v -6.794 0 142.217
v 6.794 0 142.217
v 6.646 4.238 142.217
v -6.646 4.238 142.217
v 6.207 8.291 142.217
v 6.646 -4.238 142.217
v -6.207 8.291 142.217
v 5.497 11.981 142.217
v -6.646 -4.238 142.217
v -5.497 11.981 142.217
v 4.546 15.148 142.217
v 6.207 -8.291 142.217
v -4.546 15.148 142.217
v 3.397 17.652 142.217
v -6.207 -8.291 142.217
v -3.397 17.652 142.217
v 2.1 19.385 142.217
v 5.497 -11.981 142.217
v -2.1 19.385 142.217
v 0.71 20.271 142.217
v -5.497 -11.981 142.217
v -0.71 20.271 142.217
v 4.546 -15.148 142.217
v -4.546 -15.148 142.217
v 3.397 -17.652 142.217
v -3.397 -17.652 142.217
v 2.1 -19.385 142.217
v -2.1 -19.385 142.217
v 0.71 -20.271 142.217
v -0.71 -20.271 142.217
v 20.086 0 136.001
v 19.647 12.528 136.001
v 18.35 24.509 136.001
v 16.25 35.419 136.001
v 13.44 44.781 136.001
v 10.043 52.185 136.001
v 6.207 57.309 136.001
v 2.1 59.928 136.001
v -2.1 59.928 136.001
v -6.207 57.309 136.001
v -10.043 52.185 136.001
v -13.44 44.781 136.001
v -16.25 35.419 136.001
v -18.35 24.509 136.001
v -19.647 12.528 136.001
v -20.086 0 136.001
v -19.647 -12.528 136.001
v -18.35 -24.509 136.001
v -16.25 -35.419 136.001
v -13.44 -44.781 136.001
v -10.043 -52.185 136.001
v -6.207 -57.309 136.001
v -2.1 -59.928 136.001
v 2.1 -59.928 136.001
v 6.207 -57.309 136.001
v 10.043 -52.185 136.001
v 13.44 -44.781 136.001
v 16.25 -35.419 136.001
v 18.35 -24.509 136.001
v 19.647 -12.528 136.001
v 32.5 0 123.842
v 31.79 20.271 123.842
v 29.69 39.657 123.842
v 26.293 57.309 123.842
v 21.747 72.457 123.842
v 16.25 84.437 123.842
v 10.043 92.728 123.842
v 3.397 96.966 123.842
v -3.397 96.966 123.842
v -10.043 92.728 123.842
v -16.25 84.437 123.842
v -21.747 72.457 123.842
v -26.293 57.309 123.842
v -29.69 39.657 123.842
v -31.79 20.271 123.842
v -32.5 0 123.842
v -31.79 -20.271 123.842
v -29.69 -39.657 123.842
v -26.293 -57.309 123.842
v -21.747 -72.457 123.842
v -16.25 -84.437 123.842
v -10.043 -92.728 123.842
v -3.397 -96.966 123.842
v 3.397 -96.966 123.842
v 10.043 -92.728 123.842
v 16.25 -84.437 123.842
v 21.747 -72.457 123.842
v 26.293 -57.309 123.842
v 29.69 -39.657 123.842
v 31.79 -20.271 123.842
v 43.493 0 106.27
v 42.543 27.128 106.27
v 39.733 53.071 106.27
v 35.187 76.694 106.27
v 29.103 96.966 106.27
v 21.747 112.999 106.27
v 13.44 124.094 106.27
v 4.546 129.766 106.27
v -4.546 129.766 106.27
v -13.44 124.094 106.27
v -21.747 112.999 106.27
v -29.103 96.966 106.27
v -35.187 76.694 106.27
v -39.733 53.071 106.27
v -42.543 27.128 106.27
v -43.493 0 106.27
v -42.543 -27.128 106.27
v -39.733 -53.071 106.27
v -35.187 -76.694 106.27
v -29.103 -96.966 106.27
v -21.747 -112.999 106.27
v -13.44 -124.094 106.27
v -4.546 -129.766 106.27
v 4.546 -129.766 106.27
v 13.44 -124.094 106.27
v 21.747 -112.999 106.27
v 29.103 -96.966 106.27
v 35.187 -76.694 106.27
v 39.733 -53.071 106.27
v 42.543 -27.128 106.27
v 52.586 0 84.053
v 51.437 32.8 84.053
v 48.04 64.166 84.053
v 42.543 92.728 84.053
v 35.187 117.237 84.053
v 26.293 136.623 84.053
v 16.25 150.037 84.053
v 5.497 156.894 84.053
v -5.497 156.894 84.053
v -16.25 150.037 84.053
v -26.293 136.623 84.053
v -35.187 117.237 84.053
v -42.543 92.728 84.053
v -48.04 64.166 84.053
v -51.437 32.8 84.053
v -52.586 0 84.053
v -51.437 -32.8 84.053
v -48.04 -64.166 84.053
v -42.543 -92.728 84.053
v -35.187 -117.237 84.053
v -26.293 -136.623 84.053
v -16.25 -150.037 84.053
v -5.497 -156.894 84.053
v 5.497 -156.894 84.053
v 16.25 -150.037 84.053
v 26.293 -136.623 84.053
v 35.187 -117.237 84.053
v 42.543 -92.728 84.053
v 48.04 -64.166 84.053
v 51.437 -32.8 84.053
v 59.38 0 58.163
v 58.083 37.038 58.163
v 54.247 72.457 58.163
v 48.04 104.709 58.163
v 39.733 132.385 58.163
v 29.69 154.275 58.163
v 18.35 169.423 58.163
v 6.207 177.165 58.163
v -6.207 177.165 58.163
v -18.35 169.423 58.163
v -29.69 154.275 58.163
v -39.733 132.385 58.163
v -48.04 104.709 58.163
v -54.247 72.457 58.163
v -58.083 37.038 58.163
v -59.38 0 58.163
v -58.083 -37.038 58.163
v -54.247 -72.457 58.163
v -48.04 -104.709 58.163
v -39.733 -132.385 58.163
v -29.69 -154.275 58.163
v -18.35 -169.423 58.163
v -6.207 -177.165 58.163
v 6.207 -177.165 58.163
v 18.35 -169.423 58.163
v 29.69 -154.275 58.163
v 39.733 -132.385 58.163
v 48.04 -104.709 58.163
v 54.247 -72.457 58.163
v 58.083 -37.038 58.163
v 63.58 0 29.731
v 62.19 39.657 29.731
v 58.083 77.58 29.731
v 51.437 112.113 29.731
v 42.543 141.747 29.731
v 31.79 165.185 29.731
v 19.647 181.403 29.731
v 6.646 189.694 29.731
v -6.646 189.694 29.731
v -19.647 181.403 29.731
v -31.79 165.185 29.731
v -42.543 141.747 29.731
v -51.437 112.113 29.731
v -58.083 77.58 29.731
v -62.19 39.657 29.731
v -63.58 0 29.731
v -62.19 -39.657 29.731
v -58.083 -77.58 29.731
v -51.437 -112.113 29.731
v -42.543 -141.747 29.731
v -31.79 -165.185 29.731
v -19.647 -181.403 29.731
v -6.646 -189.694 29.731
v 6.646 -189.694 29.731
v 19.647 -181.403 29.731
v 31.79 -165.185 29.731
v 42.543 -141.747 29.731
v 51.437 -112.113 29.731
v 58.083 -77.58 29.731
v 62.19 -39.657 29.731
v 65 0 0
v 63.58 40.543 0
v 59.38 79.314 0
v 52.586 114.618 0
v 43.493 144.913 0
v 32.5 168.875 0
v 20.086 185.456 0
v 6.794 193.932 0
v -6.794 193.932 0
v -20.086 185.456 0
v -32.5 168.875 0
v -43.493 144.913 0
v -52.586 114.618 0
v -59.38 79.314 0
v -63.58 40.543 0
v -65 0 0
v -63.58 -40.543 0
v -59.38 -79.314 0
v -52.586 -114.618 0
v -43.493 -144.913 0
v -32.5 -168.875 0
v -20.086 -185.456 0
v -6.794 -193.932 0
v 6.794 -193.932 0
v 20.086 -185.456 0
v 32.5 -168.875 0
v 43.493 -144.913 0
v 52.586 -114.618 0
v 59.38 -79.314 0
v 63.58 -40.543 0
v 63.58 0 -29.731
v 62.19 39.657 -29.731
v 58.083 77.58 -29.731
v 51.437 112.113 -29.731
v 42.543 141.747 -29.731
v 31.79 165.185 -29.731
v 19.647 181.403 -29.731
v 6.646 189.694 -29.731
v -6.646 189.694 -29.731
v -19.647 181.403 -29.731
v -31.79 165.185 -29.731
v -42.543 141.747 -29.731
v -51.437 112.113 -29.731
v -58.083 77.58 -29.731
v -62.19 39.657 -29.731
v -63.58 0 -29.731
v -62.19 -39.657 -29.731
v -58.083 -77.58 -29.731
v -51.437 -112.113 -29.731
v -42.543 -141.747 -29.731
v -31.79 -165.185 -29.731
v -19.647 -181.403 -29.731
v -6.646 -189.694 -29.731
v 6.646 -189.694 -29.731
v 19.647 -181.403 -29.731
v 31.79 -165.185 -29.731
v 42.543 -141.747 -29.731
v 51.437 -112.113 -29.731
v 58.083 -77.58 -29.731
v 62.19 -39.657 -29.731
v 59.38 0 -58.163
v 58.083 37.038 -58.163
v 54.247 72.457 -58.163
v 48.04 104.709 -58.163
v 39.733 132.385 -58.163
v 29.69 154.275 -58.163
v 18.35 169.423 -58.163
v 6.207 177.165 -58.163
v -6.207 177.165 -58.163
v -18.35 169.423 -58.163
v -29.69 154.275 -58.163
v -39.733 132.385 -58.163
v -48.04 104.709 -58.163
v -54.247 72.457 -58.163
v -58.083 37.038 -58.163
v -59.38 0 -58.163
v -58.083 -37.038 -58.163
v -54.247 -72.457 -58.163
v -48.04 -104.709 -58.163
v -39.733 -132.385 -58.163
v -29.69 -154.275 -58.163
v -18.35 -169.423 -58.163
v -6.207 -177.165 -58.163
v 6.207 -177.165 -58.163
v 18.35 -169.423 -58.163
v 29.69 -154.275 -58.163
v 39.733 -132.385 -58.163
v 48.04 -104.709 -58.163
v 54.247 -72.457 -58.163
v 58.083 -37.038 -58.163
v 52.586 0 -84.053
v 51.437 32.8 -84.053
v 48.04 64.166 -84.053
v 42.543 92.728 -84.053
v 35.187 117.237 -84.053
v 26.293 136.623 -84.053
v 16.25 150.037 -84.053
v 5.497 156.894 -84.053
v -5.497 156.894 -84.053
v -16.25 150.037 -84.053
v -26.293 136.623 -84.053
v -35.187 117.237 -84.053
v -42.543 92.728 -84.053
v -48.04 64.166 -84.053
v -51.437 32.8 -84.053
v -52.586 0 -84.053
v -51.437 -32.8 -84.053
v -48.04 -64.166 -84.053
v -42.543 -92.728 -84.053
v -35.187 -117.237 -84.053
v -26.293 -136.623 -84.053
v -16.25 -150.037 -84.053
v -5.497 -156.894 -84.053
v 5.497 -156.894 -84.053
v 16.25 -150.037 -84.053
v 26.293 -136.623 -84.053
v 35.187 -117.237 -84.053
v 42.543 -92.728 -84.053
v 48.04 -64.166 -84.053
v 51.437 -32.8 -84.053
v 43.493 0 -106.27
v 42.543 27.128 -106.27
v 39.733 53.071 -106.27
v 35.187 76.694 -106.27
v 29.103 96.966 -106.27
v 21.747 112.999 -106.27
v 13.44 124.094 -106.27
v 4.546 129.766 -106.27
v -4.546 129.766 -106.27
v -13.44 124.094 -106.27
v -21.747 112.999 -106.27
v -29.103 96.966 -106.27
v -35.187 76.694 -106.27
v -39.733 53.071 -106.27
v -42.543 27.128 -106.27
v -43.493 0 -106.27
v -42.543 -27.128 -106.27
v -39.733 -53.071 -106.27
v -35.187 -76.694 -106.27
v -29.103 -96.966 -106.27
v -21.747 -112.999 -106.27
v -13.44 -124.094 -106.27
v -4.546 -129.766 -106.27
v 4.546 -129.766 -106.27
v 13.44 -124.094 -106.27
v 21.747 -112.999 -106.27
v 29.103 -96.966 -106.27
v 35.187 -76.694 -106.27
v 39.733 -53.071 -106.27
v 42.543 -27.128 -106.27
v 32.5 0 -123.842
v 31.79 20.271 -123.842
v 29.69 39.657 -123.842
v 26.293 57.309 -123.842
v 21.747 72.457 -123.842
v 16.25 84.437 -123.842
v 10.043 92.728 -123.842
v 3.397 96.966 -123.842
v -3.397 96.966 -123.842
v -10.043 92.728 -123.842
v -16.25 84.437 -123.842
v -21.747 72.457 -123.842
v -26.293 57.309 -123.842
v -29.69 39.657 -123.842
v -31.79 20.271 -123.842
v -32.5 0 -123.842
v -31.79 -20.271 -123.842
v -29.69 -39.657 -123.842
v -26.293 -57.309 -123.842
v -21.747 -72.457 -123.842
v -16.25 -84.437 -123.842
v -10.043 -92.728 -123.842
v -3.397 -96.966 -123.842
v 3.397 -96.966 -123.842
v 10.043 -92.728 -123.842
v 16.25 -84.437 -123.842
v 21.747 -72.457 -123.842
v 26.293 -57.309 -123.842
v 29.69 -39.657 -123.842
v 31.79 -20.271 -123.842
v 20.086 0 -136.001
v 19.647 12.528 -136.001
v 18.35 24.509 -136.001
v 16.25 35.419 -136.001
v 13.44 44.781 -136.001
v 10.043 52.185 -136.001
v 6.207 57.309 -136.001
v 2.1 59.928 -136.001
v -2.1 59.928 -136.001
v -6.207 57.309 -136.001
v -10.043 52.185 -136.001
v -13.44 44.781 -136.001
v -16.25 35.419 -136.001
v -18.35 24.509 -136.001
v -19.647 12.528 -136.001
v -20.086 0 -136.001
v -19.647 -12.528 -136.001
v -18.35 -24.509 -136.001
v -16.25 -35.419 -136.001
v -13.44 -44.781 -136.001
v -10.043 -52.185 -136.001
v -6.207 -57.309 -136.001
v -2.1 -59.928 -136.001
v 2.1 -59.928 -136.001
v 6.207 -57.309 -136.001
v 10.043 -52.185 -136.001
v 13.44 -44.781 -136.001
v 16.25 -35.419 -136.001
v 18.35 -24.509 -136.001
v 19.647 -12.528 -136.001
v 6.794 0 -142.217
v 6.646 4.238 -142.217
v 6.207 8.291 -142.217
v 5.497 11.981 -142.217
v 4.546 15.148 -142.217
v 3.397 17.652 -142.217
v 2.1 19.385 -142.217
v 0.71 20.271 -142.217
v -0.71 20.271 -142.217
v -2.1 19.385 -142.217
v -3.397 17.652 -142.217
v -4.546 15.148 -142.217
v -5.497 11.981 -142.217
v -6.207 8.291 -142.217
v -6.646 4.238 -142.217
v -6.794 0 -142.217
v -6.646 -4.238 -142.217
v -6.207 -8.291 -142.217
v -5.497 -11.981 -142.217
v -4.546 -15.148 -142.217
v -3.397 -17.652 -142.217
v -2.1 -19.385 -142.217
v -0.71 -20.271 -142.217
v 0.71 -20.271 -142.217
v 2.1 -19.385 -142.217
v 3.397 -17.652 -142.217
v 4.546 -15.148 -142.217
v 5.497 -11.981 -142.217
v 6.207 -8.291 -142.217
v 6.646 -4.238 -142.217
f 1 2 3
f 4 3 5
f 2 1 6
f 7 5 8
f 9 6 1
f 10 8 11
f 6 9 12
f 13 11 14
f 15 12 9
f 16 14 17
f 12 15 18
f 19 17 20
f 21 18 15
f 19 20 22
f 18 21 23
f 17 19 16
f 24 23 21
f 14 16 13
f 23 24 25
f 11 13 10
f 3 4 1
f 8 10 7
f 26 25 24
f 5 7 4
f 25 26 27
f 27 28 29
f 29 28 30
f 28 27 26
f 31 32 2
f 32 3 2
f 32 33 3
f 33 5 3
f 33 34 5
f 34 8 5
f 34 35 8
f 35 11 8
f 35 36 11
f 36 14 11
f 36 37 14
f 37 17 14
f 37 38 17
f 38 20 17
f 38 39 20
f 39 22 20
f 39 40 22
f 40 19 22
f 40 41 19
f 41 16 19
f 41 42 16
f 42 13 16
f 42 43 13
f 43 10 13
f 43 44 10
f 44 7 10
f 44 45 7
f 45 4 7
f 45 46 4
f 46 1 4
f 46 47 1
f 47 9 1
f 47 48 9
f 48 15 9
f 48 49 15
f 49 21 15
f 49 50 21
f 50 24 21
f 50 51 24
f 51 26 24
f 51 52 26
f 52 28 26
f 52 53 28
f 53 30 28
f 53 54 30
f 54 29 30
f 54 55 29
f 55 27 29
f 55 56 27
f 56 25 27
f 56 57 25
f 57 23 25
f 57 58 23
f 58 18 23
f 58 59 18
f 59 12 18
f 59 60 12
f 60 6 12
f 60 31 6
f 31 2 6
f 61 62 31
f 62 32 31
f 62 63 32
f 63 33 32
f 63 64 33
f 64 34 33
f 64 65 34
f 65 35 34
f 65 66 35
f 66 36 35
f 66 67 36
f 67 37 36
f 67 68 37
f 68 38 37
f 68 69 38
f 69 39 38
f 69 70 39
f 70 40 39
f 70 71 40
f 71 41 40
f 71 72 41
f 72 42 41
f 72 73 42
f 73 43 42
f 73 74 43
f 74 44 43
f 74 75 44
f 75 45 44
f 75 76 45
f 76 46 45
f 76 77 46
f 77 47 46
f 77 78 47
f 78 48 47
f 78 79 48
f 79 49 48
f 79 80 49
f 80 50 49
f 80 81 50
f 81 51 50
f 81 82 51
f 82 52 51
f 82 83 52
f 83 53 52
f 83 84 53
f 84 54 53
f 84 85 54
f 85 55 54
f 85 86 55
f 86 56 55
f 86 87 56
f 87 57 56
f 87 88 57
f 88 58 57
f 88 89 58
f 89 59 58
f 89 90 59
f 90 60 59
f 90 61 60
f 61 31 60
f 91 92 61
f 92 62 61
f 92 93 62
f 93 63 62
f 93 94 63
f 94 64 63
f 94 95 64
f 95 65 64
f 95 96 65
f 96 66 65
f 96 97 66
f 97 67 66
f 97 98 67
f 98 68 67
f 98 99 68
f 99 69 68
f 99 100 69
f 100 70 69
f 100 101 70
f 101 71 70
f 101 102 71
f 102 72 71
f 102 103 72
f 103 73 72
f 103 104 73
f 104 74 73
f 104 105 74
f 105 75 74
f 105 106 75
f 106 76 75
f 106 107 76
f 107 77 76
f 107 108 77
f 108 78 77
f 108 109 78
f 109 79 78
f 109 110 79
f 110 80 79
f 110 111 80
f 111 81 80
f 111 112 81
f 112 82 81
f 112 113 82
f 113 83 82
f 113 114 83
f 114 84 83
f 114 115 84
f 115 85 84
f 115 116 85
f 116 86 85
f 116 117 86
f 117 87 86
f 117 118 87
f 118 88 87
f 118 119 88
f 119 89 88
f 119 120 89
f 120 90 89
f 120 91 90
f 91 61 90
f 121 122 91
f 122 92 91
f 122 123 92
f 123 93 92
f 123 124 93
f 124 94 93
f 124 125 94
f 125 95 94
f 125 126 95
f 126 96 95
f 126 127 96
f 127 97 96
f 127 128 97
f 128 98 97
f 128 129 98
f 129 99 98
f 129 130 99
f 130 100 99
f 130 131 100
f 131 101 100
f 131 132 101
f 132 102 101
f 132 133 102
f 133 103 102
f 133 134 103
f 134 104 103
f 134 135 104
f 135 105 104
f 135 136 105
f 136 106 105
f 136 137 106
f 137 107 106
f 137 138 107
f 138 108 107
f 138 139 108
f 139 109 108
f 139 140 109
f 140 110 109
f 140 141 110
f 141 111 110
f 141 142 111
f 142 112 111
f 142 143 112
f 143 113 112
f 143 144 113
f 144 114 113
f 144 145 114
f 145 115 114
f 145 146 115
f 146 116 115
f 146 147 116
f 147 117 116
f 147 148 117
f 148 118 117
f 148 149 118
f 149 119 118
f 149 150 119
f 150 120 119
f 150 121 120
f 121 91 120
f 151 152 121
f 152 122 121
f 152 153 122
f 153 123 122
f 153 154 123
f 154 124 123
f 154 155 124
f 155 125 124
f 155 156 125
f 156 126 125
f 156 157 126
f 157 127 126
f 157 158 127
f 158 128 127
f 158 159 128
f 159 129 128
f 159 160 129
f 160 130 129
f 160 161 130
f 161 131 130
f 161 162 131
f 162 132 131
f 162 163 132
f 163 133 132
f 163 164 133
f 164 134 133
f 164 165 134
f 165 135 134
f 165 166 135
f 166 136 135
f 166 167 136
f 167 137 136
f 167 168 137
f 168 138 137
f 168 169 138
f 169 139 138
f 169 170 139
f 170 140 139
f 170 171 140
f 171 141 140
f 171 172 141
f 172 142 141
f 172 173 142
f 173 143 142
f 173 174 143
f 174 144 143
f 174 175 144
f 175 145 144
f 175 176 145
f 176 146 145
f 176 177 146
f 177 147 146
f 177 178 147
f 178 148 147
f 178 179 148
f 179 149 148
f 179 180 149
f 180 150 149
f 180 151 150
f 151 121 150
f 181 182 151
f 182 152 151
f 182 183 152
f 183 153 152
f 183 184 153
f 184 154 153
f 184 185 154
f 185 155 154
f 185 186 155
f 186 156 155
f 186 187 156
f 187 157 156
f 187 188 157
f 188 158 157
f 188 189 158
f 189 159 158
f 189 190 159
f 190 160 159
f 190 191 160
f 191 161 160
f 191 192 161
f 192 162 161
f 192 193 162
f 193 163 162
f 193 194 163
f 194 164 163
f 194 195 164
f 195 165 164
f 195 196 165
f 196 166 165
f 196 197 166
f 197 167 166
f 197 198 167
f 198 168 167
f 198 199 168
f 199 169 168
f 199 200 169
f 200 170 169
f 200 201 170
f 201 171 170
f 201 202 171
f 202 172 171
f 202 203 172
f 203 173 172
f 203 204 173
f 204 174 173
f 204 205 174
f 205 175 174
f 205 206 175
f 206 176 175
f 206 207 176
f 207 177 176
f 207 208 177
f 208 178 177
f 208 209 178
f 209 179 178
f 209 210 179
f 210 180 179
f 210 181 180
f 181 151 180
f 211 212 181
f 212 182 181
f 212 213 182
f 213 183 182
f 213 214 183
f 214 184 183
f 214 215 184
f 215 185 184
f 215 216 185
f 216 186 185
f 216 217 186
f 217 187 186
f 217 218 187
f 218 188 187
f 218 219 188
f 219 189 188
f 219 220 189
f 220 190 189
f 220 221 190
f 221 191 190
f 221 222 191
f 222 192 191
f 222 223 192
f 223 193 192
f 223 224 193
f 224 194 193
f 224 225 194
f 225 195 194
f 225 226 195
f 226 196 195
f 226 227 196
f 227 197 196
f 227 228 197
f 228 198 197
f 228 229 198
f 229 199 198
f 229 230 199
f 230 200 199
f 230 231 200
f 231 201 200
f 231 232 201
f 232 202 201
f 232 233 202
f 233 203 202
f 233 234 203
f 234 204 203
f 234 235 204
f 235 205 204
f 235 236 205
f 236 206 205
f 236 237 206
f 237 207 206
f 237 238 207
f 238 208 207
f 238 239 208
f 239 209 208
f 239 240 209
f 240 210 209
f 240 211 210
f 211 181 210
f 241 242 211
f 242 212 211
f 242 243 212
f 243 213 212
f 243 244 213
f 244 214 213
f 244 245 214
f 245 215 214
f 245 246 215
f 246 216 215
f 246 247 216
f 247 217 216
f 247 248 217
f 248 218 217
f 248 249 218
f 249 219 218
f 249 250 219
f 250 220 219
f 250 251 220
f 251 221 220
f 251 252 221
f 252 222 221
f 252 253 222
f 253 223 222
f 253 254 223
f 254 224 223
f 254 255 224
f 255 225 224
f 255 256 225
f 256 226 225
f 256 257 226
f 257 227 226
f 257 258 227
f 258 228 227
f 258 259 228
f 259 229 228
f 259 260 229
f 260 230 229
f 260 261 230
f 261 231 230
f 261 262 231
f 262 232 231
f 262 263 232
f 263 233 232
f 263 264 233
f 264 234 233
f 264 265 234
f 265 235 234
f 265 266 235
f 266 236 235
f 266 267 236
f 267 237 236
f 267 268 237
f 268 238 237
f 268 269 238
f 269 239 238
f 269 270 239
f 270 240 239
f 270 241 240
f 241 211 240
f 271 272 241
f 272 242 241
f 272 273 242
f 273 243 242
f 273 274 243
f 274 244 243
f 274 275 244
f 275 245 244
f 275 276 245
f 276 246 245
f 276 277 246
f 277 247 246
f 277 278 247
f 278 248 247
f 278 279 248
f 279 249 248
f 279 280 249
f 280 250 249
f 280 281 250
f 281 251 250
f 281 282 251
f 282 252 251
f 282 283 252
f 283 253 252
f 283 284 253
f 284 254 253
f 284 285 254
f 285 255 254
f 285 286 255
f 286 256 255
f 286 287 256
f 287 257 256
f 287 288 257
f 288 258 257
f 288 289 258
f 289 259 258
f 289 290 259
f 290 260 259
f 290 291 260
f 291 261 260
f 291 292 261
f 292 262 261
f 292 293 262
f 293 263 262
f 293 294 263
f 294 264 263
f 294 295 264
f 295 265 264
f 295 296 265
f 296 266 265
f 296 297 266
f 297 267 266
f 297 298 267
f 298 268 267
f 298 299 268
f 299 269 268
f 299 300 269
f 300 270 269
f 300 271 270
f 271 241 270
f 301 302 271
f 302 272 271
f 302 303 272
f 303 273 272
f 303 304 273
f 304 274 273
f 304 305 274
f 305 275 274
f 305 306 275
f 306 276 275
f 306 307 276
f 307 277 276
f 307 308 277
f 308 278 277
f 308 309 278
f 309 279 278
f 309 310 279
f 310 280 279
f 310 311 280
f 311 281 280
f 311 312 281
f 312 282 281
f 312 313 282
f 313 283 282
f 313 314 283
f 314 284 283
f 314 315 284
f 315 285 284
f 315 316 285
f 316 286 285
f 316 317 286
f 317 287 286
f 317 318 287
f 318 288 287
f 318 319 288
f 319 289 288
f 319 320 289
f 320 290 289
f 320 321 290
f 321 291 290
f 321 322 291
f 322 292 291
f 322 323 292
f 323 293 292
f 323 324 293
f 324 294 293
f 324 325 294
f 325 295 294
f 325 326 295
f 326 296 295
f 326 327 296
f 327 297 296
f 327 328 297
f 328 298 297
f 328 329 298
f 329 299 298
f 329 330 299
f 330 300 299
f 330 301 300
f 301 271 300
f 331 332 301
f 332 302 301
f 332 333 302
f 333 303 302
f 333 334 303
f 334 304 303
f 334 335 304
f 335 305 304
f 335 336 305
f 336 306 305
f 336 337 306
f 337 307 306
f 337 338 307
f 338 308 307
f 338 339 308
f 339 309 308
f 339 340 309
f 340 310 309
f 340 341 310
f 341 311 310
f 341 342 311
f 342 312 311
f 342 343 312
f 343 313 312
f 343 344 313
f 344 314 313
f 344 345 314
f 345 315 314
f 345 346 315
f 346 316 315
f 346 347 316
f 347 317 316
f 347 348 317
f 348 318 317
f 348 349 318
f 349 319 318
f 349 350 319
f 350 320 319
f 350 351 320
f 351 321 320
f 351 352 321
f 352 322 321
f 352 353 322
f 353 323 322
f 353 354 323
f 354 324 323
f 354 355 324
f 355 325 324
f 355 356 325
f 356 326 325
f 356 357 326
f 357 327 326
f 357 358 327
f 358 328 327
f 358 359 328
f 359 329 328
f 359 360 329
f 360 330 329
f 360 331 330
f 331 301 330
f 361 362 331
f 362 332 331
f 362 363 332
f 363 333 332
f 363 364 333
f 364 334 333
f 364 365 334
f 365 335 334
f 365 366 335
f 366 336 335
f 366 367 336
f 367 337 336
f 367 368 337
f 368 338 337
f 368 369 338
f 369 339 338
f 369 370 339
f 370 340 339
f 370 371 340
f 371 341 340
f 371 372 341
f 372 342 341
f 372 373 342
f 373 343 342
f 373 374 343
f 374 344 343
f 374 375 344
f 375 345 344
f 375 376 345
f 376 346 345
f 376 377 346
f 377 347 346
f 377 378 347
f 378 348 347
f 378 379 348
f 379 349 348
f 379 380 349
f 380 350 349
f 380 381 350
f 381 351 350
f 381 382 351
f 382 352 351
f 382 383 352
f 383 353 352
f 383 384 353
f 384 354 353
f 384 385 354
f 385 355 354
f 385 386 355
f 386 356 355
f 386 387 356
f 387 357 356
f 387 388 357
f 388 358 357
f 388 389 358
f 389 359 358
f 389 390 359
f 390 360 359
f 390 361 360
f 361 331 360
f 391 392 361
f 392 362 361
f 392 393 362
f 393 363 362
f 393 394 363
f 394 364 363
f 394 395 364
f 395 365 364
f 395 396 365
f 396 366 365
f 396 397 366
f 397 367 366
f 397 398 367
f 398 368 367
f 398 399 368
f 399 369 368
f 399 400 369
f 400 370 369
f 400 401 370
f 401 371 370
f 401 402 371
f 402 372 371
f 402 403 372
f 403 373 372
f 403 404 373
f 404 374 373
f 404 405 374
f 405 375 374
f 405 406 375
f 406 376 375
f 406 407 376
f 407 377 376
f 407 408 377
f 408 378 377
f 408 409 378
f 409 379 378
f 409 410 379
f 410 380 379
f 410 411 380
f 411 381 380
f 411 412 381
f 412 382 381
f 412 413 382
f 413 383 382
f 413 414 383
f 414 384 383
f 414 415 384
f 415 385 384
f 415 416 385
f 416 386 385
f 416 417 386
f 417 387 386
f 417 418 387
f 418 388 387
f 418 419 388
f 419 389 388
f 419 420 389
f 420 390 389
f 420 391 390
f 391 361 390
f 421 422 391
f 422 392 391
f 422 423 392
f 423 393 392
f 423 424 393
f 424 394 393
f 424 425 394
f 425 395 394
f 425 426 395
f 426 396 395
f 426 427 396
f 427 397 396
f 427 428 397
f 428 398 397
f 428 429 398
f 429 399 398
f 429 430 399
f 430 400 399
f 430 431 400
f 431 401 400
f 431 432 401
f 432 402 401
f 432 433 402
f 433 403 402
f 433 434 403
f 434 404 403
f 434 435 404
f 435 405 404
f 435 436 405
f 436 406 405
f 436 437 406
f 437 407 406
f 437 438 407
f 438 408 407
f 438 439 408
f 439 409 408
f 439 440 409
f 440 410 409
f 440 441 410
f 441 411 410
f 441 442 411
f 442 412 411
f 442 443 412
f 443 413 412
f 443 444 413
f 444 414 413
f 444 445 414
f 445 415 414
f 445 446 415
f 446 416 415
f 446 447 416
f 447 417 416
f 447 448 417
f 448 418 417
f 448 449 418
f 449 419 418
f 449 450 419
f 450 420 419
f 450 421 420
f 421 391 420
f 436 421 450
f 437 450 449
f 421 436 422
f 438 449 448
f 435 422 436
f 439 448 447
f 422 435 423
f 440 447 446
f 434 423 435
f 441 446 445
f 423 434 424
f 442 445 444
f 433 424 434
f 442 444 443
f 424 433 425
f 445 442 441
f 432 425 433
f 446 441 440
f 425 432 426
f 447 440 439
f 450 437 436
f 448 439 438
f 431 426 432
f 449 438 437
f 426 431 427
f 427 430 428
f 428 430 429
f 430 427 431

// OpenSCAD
// Generated by SolidPython 1.0.1 on 2020-07-29 00:46:46


scale(v = [5, 15, 11]) {
	sphere(r = 13);
}
/***********************************************
*********      SolidPython code:      **********
************************************************
 
# import packages: SolidPython
from solid import *
from solid.utils import *
from itertools import chain, combinations, permutations


class Resize:

    def __init__(self, scad_file):
        self.scad_file = scad_file
        #self.scad_file = import_scad(scad_file)
        # cone/cylinder param:
        self.r1 = 0
        self.r2 = 0
        self.h = 0
        # rectangular prism param:
        self.w = 0
        self.l = 0
        # ellipse param:
        self.r = 0

    # import OpenScad code (file name corresponds to shape)


    # classify shape + parameters
    def assign(self, param1, param2, param3):
        if self.scad_file == 'cone.scad':
            self.r1 = param1
            self.r2 = param2
            self.h = param3
        elif self.scad_file == 'cylinder.scad':
            self.r1 = param1
            self.r2 = param2
            self.h = param3
        elif self.scad_file == 'rectangularPrism.scad':
            self.h = param1
            self.l = param2
            self.w = param3
        else:
            self.r = param1
            self.h = param2

    # resize parameters
    def iterate(self):
        x = range(3, 20, 2)
        i = 1
        if self.scad_file == 'cone.scad':
            tempList = list(permutations(x, 2))
            for temp in tempList:
                param1 = temp[0]
                param2 = temp[1]
                filepath = 'produced_scad_files/' + 'cone' + str(param1) + '_' + str(param2) + '_' + '.scad'
                scad_render_to_file(cylinder(h=param1, r1=param2, r2=0), filepath)

        elif self.scad_file == 'cylinder.scad':
            tempList = list(permutations(x, 3))
            for temp in tempList:
                param1 = temp[0]
                param2 = temp[1]
                filepath = 'produced_scad_files/' + 'cylinder' + str(param1) + '_' + str(param2) + '_' + '.scad'
                scad_render_to_file(cylinder(h=param1, r1=param2, r2=param2), filepath)

        elif self.scad_file == 'rectangularPrism.scad':
            tempList = list(permutations(x, 3))
            for temp in tempList:
                param1 = temp[0]
                param2 = temp[1]
                param3 = temp[2]
                filepath = 'produced_scad_files/' + 'rectangularPrism' + str(param1) + '_' + str(param2) + '_' + str(
                    param3) + '.scad'
                scad_render_to_file(cube(size=(param1, param2, param3)), filepath)

        elif self.scad_file == 'ellipse.scad':
            tempList = list(permutations(x, 4))
            for temp in tempList:
                param1 = temp[0]
                param2 = temp[1]
                param3 = temp[2]
                param4 = temp[3]
                filepath = 'produced_scad_files/' + 'ellipse' + str(param1) + '_' + str(param2) + '_' + str(param3) + '_' + str(param4) + '.scad'
                scad_render_to_file(scale([param1, param2, param3])(sphere(r=param4)), filepath)

    def render_to_scadfile(self):
        scad_render_to_file(scad, 'example.scad') 
 
************************************************/
